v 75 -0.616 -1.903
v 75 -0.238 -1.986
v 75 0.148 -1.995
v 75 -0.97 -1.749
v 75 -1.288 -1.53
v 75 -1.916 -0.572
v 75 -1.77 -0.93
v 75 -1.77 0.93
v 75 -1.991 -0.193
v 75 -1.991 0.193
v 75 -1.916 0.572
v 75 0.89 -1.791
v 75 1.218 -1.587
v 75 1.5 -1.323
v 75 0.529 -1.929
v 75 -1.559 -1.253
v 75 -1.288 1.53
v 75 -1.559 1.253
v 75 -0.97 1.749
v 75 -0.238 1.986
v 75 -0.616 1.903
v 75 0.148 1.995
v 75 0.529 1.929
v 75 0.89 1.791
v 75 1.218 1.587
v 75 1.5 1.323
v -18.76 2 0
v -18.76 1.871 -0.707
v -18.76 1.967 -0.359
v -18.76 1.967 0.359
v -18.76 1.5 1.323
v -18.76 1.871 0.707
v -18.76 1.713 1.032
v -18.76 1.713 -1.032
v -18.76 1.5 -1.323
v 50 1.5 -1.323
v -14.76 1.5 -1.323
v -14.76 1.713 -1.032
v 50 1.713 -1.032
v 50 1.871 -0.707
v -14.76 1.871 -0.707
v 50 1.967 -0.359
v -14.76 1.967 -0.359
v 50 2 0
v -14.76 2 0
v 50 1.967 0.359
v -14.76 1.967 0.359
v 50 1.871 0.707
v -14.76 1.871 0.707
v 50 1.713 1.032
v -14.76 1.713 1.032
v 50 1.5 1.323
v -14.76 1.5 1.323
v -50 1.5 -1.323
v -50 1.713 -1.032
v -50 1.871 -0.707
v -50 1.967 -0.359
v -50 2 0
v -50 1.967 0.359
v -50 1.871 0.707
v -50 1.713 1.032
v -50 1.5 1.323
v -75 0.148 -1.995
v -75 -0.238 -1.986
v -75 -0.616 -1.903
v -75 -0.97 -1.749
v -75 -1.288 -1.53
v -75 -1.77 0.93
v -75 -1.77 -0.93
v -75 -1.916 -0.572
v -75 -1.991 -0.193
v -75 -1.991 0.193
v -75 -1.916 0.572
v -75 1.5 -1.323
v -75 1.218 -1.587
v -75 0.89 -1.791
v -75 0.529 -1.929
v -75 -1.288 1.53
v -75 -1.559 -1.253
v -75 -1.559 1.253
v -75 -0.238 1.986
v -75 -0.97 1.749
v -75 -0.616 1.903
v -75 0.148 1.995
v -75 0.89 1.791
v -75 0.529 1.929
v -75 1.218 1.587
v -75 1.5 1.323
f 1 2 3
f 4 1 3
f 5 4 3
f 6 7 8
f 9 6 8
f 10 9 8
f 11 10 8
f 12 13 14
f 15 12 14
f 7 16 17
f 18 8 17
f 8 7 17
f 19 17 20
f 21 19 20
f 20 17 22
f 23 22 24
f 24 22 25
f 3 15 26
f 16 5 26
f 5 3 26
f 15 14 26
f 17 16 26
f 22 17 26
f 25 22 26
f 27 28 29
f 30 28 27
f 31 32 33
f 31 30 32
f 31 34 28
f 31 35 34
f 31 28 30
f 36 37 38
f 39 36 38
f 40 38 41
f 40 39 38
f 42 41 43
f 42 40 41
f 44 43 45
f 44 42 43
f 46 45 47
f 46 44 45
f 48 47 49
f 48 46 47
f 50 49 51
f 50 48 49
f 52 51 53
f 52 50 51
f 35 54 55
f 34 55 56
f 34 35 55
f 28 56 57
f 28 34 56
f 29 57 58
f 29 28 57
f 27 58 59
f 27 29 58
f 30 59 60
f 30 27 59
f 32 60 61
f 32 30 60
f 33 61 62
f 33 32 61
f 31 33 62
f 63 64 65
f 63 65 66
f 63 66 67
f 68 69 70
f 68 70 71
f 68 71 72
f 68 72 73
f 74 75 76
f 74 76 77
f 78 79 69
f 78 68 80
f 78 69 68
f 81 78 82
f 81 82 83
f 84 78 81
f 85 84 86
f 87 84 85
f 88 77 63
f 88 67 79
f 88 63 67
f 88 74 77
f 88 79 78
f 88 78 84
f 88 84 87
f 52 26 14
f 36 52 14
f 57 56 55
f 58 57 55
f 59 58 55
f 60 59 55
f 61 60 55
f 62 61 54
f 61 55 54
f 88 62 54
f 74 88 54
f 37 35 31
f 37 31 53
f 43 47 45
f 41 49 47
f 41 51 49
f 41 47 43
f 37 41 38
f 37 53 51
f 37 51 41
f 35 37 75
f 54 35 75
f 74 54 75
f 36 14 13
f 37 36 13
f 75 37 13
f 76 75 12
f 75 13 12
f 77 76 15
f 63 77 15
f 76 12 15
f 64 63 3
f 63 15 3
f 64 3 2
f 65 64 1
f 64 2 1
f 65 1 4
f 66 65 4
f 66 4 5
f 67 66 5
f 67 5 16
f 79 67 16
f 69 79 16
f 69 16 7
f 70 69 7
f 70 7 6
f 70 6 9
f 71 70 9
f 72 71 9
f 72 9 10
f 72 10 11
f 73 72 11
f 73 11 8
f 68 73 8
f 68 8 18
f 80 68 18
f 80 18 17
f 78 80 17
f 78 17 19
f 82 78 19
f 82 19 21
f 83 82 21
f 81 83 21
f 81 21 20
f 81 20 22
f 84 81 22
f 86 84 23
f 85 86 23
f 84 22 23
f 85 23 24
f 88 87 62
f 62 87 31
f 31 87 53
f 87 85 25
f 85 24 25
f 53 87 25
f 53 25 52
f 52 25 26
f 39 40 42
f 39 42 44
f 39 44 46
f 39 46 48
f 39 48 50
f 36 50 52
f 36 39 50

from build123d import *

# Parameters (mm, degrees)
BOSS_EXTRUDE1_DEPTH     = 75
SKETCH2_R               = 2
BOSS_EXTRUDE2_DEPTH     = 50
SKETCH3_W               = 4
SKETCH3_H               = 0.5
CUT_EXTRUDE1_DEPTH      = 3
CUT_EXTRUDE1_DEPTH_BACK = 3


with BuildPart() as part:
    # Sketch1 → Boss-Extrude1 (new body, symmetric)
    with BuildSketch(Plane(origin=(0, 0, 0), x_dir=(0, 0, -1), z_dir=(1, 0, 0))):
        with BuildLine():
            Line((-1.322875656, 1.5), (1.322875656, 1.5))
            ThreePointArc((1.322875656, 1.5), (0, -2), (-1.322875656, 1.5))
        make_face()
    extrude(amount=BOSS_EXTRUDE1_DEPTH, both=True)

    # Sketch2 → Boss-Extrude2 (add, symmetric)
    with BuildSketch(Plane(origin=(0, 0, 0), x_dir=(0, 0, -1), z_dir=(1, 0, 0))):
        Circle(SKETCH2_R)
    extrude(amount=BOSS_EXTRUDE2_DEPTH, both=True)

    # Sketch3 → Cut-Extrude1 (cut, two sides)
    with BuildSketch(Plane.XY) as cut_extrude1_sk:
        with Locations((-16.76, 1.75)):
            Rectangle(SKETCH3_W, SKETCH3_H)
    extrude(amount=CUT_EXTRUDE1_DEPTH, mode=Mode.SUBTRACT)
    extrude(cut_extrude1_sk.sketch, amount=-CUT_EXTRUDE1_DEPTH_BACK, mode=Mode.SUBTRACT)


solid = part.part
